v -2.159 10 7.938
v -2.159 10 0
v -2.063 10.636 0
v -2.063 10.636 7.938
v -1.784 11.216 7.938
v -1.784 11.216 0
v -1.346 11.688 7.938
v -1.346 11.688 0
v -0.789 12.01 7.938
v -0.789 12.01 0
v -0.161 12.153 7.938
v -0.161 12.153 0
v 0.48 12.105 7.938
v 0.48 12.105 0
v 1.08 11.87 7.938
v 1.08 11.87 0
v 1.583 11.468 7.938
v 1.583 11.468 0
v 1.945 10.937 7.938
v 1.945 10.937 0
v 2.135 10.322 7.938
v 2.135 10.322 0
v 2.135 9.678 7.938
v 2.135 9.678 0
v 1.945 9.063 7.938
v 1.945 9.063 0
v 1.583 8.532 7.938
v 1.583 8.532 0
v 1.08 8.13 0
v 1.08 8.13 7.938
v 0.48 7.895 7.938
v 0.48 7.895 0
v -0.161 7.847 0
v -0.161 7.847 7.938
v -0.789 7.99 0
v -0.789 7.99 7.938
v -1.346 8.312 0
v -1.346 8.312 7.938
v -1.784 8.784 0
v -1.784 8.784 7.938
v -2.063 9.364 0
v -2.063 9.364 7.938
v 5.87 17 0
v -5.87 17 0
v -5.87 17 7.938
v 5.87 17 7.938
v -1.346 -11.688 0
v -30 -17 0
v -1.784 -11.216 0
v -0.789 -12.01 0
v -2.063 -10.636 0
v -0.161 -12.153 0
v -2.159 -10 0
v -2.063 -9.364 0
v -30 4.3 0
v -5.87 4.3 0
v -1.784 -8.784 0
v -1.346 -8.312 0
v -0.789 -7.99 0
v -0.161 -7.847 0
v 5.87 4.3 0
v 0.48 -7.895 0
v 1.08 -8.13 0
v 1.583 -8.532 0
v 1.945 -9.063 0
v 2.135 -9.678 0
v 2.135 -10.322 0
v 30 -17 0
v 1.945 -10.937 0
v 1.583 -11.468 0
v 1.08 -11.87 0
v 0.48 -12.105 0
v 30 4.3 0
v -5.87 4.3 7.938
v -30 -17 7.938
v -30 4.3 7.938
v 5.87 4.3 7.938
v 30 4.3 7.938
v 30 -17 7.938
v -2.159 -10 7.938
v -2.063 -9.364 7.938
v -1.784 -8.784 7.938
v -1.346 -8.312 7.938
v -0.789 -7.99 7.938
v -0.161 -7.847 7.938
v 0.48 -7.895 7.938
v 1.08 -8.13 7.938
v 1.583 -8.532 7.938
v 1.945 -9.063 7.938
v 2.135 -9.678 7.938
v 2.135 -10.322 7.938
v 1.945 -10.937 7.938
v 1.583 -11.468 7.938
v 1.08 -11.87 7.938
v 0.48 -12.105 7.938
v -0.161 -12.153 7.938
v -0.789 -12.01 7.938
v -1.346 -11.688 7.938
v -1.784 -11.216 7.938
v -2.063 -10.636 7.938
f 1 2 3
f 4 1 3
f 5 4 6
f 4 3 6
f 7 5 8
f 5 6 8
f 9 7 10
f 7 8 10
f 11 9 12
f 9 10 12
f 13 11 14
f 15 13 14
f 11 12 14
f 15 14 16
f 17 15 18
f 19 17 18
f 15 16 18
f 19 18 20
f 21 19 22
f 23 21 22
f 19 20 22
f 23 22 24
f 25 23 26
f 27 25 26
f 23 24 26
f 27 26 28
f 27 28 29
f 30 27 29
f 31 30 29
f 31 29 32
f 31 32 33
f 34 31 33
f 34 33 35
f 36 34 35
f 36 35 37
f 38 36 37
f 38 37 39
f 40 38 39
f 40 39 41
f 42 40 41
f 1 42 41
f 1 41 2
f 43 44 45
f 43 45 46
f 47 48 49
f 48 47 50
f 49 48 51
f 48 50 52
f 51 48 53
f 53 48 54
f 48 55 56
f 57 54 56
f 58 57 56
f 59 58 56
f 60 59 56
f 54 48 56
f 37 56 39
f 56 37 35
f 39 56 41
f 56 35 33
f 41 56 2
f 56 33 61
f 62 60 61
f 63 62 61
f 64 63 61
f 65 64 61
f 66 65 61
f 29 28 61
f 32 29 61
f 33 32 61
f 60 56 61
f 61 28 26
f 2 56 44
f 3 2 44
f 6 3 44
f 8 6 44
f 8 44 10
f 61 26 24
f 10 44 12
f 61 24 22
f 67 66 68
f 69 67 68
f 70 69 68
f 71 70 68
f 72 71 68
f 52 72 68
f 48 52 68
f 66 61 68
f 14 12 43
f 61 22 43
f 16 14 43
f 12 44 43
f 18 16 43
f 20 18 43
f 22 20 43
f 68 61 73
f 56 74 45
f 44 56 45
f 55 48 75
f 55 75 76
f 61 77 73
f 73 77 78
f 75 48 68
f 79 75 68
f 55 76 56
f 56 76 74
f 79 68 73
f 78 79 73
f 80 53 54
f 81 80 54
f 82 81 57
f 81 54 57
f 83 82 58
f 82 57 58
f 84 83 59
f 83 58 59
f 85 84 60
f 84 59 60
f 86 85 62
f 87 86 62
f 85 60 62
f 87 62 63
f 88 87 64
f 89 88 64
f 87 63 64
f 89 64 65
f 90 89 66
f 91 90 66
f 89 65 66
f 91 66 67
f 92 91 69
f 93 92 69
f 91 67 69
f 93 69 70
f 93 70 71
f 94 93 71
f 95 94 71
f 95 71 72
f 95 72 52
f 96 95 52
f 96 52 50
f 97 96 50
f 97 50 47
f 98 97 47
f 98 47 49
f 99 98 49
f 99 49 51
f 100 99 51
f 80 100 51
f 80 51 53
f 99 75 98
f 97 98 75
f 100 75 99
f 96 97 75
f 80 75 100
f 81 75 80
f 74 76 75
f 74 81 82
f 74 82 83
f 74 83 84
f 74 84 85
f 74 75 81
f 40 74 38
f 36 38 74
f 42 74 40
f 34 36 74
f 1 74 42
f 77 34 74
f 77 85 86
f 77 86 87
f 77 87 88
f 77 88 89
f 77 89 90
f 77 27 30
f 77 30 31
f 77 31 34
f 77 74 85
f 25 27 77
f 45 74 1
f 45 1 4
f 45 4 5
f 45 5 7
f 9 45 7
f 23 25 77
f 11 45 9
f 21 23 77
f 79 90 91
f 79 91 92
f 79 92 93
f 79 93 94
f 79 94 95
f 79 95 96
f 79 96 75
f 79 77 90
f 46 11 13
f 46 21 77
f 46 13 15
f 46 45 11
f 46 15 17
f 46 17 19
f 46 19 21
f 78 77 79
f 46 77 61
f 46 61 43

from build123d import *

# Parameters (mm, degrees)
F0_W     = 60
F0_H     = 34
F1_DEPTH = 7.9375
F3_D     = 4.318
F4_W     = 24.13
F4_H     = 12.7
F5_DEPTH = 7.9385


with BuildPart() as f1:
    # F0 (on Top) → F1 (new body)
    with BuildSketch(Plane.XY):
        Rectangle(F0_W, F0_H)
    extrude(amount=F1_DEPTH)

    # F3 (through all)
    with Locations(Plane.XY.offset(7.9375)):
        with Locations((0, 10), (0, -10)):
            Hole(F3_D / 2)

    # F4 (on face) → F5 (cut, through all)
    with BuildSketch(Plane.XY.offset(7.9375)):
        with Locations((-17.935, 10.65)):
            Rectangle(F4_W, F4_H)
        with Locations((17.935, 10.65)):
            Rectangle(F4_W, F4_H)
    extrude(amount=-F5_DEPTH, mode=Mode.SUBTRACT)


solid = f1.part
